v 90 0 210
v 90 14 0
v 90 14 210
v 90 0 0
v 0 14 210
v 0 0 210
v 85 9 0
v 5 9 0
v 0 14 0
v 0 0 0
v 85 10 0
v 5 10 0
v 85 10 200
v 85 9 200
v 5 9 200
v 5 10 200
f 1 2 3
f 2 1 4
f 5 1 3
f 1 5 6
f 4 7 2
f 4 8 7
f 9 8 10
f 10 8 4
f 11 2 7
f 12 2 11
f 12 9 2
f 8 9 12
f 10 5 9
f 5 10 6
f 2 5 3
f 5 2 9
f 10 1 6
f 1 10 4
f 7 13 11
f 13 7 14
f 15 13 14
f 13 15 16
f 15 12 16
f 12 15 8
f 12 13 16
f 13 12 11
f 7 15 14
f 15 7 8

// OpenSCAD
// Door parameters
door_width = 80;
door_height = 200;
door_thickness = 4;
hinge_radius = 3;
hinge_height = 20;

module door() {
    color("brown")
    cube([door_width, door_thickness, door_height]);
}

module frame() {
    difference() {
        color("gray")
        cube([door_width + 10, door_thickness + 10, door_height + 10]);
        
        translate([5, 5, 0])
        cube([door_width, door_thickness + 1, door_height]);
    }
}

module hinge() {
    color("silver")
    cylinder(h = hinge_height, r = hinge_radius, $fn = 20);
}

frame();

function easeInOutQuad(t) = 
    t < 0.5 ? 2 * t * t : -1 + (4 - 2 * t) * t;

angle = -90 * easeInOutQuad(($t < 0.5) ? $t * 2 : 2 - $t * 2);

translate([door_width + 5, 5, 20])
hinge();

translate([door_width + 5, 5, door_height - 20])
hinge();

translate([door_width + 5, 5, 0])
rotate([0, 0, angle])
translate([-door_width, 0, 0])
door();
